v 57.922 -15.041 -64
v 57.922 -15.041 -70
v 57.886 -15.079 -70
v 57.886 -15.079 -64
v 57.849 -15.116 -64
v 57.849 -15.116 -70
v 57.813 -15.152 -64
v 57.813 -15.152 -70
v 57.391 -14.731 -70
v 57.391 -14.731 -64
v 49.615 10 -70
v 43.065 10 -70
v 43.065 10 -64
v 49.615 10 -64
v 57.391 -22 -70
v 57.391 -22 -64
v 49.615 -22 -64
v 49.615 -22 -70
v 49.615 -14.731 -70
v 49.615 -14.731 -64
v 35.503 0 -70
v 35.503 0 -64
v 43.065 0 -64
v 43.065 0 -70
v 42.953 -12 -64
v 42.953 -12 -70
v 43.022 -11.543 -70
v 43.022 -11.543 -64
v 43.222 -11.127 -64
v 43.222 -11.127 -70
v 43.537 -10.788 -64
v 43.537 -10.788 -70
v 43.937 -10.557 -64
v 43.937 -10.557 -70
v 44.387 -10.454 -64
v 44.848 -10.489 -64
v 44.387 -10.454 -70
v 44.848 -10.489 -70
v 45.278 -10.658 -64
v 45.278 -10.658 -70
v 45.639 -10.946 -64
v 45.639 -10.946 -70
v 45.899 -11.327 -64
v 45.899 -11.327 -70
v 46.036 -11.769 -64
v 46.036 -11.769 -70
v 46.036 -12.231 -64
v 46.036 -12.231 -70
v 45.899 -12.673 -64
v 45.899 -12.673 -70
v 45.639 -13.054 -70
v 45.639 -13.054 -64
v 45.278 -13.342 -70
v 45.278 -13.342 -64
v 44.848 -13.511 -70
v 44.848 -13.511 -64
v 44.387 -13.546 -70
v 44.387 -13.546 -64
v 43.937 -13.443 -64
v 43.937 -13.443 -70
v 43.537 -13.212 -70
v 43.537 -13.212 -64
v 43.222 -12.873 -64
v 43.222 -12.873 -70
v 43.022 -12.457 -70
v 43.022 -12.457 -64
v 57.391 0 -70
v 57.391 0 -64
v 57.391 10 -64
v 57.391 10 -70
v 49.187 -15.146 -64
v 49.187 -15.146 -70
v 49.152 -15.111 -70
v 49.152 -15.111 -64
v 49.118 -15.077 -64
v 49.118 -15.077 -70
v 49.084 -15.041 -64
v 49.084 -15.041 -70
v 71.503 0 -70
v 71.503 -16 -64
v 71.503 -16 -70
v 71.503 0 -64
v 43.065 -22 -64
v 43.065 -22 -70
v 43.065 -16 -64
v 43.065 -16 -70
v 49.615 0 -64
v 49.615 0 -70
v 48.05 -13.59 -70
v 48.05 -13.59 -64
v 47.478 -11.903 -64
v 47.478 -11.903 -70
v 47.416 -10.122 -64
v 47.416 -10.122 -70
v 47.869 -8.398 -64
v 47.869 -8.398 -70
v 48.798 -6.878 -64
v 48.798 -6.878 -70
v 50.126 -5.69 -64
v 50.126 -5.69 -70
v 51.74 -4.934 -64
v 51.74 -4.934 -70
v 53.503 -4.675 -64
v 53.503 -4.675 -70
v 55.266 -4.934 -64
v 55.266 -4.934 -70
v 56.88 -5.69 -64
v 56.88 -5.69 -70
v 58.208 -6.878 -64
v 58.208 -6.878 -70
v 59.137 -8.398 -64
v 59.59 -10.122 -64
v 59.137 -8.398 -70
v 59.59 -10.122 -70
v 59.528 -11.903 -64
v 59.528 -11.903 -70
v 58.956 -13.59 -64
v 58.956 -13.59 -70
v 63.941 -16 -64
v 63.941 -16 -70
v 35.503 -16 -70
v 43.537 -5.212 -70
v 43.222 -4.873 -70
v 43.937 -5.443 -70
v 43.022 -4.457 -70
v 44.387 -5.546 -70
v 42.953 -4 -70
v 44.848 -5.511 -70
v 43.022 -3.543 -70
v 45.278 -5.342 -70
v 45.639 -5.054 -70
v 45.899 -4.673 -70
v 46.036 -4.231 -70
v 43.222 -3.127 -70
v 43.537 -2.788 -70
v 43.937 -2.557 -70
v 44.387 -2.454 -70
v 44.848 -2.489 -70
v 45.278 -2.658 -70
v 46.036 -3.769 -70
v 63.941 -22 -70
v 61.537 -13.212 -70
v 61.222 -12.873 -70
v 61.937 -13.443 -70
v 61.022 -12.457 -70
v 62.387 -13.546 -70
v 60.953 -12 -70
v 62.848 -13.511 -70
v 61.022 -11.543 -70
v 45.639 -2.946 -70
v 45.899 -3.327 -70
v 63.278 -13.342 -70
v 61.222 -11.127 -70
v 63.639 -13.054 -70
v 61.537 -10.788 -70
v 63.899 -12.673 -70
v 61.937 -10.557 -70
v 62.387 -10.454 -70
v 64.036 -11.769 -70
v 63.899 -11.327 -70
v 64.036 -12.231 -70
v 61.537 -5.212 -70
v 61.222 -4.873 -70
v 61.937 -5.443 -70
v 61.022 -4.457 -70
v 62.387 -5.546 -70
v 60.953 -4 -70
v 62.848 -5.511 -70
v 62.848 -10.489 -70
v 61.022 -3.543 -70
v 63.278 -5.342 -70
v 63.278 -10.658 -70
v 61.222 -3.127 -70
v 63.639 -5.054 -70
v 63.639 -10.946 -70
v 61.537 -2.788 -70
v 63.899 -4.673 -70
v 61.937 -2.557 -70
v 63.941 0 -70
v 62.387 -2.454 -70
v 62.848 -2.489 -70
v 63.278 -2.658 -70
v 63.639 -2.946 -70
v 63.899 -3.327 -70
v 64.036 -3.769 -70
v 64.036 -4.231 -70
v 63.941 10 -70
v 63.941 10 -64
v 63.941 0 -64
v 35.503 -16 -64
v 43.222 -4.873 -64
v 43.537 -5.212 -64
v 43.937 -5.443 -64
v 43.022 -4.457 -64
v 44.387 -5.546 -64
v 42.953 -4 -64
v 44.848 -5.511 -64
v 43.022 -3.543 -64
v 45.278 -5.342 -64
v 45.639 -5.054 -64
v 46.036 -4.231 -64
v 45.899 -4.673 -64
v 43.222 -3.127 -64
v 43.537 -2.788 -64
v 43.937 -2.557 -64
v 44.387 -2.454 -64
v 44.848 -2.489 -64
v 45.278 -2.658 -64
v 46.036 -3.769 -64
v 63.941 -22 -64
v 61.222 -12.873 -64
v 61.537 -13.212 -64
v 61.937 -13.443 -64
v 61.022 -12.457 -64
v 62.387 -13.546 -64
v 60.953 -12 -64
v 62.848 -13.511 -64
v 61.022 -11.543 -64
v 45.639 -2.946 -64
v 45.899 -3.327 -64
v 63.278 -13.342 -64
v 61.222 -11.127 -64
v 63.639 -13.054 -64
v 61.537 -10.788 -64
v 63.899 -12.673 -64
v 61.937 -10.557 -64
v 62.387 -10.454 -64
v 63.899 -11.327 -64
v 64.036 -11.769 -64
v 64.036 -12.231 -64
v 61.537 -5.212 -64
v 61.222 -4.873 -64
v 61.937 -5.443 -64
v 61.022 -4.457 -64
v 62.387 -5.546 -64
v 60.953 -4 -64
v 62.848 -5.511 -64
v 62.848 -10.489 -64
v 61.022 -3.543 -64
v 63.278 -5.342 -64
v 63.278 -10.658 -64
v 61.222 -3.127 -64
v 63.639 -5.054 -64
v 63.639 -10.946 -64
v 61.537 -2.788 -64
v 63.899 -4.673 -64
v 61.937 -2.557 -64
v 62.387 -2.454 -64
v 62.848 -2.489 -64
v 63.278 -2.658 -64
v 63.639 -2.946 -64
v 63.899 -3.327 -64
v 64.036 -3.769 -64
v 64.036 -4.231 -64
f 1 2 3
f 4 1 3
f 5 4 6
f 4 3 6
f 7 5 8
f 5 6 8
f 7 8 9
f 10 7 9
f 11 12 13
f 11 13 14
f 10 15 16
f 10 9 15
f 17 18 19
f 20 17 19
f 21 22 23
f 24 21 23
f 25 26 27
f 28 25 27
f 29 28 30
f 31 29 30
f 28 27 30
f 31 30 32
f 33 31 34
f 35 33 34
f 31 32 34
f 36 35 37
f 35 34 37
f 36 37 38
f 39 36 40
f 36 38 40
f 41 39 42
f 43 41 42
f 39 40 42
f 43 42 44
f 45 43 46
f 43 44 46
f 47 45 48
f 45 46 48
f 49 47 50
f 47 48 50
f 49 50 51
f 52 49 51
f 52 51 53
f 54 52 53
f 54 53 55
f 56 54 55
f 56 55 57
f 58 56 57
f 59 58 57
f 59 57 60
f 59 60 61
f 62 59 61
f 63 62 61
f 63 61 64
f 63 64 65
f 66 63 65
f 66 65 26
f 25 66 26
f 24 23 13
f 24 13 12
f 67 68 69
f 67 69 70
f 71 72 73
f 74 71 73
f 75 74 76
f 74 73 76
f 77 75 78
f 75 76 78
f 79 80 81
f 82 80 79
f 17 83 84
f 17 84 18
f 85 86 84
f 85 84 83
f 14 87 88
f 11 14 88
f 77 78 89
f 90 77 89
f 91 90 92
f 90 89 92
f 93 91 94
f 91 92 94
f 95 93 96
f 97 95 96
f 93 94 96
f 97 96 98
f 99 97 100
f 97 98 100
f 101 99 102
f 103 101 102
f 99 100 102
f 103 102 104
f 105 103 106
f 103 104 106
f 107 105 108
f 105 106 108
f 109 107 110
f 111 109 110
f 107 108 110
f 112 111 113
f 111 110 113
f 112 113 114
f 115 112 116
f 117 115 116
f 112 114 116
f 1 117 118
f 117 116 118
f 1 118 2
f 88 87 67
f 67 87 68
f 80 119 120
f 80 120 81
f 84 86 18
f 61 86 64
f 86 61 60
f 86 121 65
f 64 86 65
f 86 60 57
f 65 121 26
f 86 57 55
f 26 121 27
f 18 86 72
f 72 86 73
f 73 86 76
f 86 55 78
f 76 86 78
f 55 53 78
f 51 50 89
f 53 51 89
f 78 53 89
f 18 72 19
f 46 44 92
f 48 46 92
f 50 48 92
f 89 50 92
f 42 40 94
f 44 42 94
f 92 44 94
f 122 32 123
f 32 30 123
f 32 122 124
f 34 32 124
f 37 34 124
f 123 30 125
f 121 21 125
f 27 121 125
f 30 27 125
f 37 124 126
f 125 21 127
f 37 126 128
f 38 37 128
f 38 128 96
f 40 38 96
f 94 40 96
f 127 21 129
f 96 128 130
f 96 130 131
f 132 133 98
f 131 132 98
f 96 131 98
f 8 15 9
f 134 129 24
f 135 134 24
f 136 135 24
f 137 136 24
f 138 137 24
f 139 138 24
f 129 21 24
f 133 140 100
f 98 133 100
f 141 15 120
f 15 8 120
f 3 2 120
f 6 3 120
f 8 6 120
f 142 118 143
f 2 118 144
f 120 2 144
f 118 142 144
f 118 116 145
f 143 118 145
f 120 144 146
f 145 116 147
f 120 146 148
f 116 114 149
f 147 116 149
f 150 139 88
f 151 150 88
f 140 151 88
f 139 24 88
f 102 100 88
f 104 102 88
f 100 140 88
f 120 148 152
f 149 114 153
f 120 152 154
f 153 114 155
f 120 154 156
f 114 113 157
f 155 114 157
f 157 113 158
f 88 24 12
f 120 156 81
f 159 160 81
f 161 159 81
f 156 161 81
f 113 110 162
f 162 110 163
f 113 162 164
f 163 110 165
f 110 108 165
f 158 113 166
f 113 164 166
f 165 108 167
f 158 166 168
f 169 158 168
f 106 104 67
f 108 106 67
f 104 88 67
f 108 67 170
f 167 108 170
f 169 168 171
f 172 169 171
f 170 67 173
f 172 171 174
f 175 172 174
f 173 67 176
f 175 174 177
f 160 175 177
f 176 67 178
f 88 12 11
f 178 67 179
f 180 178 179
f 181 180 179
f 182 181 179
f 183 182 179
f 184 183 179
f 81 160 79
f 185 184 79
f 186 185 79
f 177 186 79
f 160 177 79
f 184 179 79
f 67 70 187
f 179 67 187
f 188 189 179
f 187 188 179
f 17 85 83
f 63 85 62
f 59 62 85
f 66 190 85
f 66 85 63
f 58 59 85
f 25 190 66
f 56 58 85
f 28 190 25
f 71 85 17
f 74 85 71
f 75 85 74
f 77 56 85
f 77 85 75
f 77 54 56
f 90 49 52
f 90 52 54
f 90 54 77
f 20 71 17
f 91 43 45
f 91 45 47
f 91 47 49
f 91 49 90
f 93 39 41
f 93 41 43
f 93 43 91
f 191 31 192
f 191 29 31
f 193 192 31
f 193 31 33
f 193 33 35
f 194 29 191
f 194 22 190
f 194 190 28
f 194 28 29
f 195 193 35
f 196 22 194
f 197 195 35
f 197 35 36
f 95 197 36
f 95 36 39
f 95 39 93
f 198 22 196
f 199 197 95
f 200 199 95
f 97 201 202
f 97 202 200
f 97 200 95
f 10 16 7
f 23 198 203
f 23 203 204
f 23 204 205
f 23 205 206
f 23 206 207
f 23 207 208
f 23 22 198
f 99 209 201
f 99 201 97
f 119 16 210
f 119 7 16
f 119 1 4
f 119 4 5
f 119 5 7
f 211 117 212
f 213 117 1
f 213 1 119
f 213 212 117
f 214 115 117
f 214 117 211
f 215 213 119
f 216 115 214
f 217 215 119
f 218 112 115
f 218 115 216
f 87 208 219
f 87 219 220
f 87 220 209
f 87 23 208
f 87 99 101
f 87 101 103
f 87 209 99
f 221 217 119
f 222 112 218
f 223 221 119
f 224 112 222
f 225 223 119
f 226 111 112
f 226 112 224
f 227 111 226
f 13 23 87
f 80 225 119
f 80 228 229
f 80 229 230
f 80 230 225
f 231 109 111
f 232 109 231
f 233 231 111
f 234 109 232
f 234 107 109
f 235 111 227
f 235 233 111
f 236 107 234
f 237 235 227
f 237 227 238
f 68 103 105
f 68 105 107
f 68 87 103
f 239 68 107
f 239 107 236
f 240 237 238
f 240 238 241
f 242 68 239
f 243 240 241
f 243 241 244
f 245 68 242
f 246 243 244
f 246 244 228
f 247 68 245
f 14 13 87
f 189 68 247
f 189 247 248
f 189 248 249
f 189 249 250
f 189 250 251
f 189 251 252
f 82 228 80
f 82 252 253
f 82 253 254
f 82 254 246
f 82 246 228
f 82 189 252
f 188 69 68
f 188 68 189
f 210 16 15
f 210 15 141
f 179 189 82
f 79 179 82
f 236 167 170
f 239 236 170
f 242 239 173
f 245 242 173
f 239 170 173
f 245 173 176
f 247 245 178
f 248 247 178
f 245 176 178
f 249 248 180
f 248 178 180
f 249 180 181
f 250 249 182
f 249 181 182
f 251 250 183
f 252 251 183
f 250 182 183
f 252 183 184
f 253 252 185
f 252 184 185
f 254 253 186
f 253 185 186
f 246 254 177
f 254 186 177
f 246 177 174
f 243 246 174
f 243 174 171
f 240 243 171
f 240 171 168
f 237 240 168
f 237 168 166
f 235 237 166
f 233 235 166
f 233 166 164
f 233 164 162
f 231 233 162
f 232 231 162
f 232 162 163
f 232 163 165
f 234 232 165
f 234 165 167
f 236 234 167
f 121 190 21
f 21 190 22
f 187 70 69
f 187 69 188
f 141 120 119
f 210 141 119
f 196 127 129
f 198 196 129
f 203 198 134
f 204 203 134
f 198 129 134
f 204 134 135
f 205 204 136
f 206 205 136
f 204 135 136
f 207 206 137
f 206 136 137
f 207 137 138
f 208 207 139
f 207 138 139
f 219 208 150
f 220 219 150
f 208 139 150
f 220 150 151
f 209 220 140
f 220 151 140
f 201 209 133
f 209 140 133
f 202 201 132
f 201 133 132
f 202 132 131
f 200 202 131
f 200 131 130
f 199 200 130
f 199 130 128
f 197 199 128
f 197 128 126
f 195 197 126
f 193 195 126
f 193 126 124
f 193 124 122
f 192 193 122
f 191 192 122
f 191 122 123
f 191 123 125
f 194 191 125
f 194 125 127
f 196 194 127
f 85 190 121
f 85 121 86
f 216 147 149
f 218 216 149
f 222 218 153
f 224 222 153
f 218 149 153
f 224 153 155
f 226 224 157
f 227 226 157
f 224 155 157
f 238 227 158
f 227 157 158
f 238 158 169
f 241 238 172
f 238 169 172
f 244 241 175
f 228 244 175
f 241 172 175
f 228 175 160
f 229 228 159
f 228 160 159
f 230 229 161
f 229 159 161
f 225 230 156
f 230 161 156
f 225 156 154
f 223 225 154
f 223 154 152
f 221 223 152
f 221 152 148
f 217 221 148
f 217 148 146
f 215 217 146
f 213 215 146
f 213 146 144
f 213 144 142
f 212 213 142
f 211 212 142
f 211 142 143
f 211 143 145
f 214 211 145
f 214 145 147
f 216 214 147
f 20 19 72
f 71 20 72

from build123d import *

# Parameters (mm, degrees)
SZKIC1_W                      = 36
SZKIC1_H                      = 16
DODANIE_WYCI_GNI_CIE1_DEPTH   = 6
WYTNIJ_WYCI_GNI_CIE1_DEPTH    = 6
SZKIC3_R                      = 1.55
WYTNIJ_WYCI_GNI_CIE2_DEPTH    = 74.51650454
SZKIC5_W                      = 6.55
SZKIC5_H                      = 6
DODANIE_WYCI_GNI_CIE2_DEPTH   = 6
DODANIE_WYCI_GNI_CIE2_2_DEPTH = 6
SZKIC7_W                      = 6.55
SZKIC7_H                      = 6
DODANIE_WYCI_GNI_CIE3_DEPTH   = 10


with BuildPart() as part:
    # Szkic1 → Dodanie-wyciągnięcie1 (new body)
    with BuildSketch(Plane.XY.offset(-64.000000001)):
        with Locations((53.502982034, -8)):
            Rectangle(SZKIC1_W, SZKIC1_H)
    extrude(amount=-DODANIE_WYCI_GNI_CIE1_DEPTH)

    # Szkic2 → Wytnij-wyciągnięcie1 (cut)
    with BuildSketch(Plane.XY.offset(-70.000000001)):
        with BuildLine():
            Line((49.614537615, -16), (49.614537615, -14.730541148))
            Line((49.614537615, -14.730541148), (49.186780246, -15.145805693))
            ThreePointArc((49.186780246, -15.145805693), (49.13517548, -15.093936528), (49.084193998, -15.041454619))
            ThreePointArc((49.084193998, -15.041454619), (53.502982034, -4.675), (57.921770071, -15.041454619))
            ThreePointArc((57.921770071, -15.041454619), (57.867648174, -15.097128633), (57.812824874, -15.152112096))
            Line((57.812824874, -15.152112096), (57.391426454, -14.730541148))
            Line((57.391426454, -14.730541148), (57.391426454, -16))
            Line((57.391426454, -16), (49.614537615, -16))
        make_face()
    extrude(amount=WYTNIJ_WYCI_GNI_CIE1_DEPTH, mode=Mode.SUBTRACT)

    # Szkic3 → Wytnij-wyciągnięcie2 (cut, through all)
    with BuildSketch(Plane(origin=(0, 0, -70.000000001), x_dir=(-1, 0, 0), z_dir=(0, 0, -1))):
        with Locations((-62.502982034, -4)):
            Circle(SZKIC3_R)
        with Locations((-44.502982034, -4)):
            Circle(SZKIC3_R)
        with Locations((-44.502982034, -12)):
            Circle(SZKIC3_R)
        with Locations((-62.502982034, -12)):
            Circle(SZKIC3_R)
    extrude(amount=-WYTNIJ_WYCI_GNI_CIE2_DEPTH, mode=Mode.SUBTRACT)


with BuildPart() as body_2:
    # Szkic5 → Dodanie-wyciągnięcie2 (new body)
    with BuildSketch(Plane.XZ.offset(16)):
        with Locations((60.666426454, -67.000000001)):
            Rectangle(SZKIC5_W, SZKIC5_H)
    extrude(amount=DODANIE_WYCI_GNI_CIE2_DEPTH)


with BuildPart() as body_3:
    # Szkic5 → Dodanie-wyci_gni_cie2 2 (new body)
    with BuildSketch(Plane.XZ.offset(16)):
        with Locations((46.339537615, -67.000000001)):
            Rectangle(SZKIC5_W, SZKIC5_H)
    extrude(amount=DODANIE_WYCI_GNI_CIE2_2_DEPTH)


with BuildPart() as part_1:
    add(part.part)

    # Połącz6: union body 2
    add(body_2.part)

    # Szkic7 → Dodanie-wyciągnięcie3 (add)
    with BuildSketch(Plane(origin=(0, 0, 0), x_dir=(1, 0, 0), z_dir=(0, 1, 0))):
        with Locations((60.666426454, 67.000000001)):
            Rectangle(SZKIC7_W, SZKIC7_H)
        with Locations((46.339537615, 67.000000001)):
            Rectangle(SZKIC7_W, SZKIC7_H)
    extrude(amount=DODANIE_WYCI_GNI_CIE3_DEPTH)


with BuildPart() as body_3_1:
    add(body_3.part)

    # Połącz8: union part
    add(part_1.part)


solid = body_3_1.part
